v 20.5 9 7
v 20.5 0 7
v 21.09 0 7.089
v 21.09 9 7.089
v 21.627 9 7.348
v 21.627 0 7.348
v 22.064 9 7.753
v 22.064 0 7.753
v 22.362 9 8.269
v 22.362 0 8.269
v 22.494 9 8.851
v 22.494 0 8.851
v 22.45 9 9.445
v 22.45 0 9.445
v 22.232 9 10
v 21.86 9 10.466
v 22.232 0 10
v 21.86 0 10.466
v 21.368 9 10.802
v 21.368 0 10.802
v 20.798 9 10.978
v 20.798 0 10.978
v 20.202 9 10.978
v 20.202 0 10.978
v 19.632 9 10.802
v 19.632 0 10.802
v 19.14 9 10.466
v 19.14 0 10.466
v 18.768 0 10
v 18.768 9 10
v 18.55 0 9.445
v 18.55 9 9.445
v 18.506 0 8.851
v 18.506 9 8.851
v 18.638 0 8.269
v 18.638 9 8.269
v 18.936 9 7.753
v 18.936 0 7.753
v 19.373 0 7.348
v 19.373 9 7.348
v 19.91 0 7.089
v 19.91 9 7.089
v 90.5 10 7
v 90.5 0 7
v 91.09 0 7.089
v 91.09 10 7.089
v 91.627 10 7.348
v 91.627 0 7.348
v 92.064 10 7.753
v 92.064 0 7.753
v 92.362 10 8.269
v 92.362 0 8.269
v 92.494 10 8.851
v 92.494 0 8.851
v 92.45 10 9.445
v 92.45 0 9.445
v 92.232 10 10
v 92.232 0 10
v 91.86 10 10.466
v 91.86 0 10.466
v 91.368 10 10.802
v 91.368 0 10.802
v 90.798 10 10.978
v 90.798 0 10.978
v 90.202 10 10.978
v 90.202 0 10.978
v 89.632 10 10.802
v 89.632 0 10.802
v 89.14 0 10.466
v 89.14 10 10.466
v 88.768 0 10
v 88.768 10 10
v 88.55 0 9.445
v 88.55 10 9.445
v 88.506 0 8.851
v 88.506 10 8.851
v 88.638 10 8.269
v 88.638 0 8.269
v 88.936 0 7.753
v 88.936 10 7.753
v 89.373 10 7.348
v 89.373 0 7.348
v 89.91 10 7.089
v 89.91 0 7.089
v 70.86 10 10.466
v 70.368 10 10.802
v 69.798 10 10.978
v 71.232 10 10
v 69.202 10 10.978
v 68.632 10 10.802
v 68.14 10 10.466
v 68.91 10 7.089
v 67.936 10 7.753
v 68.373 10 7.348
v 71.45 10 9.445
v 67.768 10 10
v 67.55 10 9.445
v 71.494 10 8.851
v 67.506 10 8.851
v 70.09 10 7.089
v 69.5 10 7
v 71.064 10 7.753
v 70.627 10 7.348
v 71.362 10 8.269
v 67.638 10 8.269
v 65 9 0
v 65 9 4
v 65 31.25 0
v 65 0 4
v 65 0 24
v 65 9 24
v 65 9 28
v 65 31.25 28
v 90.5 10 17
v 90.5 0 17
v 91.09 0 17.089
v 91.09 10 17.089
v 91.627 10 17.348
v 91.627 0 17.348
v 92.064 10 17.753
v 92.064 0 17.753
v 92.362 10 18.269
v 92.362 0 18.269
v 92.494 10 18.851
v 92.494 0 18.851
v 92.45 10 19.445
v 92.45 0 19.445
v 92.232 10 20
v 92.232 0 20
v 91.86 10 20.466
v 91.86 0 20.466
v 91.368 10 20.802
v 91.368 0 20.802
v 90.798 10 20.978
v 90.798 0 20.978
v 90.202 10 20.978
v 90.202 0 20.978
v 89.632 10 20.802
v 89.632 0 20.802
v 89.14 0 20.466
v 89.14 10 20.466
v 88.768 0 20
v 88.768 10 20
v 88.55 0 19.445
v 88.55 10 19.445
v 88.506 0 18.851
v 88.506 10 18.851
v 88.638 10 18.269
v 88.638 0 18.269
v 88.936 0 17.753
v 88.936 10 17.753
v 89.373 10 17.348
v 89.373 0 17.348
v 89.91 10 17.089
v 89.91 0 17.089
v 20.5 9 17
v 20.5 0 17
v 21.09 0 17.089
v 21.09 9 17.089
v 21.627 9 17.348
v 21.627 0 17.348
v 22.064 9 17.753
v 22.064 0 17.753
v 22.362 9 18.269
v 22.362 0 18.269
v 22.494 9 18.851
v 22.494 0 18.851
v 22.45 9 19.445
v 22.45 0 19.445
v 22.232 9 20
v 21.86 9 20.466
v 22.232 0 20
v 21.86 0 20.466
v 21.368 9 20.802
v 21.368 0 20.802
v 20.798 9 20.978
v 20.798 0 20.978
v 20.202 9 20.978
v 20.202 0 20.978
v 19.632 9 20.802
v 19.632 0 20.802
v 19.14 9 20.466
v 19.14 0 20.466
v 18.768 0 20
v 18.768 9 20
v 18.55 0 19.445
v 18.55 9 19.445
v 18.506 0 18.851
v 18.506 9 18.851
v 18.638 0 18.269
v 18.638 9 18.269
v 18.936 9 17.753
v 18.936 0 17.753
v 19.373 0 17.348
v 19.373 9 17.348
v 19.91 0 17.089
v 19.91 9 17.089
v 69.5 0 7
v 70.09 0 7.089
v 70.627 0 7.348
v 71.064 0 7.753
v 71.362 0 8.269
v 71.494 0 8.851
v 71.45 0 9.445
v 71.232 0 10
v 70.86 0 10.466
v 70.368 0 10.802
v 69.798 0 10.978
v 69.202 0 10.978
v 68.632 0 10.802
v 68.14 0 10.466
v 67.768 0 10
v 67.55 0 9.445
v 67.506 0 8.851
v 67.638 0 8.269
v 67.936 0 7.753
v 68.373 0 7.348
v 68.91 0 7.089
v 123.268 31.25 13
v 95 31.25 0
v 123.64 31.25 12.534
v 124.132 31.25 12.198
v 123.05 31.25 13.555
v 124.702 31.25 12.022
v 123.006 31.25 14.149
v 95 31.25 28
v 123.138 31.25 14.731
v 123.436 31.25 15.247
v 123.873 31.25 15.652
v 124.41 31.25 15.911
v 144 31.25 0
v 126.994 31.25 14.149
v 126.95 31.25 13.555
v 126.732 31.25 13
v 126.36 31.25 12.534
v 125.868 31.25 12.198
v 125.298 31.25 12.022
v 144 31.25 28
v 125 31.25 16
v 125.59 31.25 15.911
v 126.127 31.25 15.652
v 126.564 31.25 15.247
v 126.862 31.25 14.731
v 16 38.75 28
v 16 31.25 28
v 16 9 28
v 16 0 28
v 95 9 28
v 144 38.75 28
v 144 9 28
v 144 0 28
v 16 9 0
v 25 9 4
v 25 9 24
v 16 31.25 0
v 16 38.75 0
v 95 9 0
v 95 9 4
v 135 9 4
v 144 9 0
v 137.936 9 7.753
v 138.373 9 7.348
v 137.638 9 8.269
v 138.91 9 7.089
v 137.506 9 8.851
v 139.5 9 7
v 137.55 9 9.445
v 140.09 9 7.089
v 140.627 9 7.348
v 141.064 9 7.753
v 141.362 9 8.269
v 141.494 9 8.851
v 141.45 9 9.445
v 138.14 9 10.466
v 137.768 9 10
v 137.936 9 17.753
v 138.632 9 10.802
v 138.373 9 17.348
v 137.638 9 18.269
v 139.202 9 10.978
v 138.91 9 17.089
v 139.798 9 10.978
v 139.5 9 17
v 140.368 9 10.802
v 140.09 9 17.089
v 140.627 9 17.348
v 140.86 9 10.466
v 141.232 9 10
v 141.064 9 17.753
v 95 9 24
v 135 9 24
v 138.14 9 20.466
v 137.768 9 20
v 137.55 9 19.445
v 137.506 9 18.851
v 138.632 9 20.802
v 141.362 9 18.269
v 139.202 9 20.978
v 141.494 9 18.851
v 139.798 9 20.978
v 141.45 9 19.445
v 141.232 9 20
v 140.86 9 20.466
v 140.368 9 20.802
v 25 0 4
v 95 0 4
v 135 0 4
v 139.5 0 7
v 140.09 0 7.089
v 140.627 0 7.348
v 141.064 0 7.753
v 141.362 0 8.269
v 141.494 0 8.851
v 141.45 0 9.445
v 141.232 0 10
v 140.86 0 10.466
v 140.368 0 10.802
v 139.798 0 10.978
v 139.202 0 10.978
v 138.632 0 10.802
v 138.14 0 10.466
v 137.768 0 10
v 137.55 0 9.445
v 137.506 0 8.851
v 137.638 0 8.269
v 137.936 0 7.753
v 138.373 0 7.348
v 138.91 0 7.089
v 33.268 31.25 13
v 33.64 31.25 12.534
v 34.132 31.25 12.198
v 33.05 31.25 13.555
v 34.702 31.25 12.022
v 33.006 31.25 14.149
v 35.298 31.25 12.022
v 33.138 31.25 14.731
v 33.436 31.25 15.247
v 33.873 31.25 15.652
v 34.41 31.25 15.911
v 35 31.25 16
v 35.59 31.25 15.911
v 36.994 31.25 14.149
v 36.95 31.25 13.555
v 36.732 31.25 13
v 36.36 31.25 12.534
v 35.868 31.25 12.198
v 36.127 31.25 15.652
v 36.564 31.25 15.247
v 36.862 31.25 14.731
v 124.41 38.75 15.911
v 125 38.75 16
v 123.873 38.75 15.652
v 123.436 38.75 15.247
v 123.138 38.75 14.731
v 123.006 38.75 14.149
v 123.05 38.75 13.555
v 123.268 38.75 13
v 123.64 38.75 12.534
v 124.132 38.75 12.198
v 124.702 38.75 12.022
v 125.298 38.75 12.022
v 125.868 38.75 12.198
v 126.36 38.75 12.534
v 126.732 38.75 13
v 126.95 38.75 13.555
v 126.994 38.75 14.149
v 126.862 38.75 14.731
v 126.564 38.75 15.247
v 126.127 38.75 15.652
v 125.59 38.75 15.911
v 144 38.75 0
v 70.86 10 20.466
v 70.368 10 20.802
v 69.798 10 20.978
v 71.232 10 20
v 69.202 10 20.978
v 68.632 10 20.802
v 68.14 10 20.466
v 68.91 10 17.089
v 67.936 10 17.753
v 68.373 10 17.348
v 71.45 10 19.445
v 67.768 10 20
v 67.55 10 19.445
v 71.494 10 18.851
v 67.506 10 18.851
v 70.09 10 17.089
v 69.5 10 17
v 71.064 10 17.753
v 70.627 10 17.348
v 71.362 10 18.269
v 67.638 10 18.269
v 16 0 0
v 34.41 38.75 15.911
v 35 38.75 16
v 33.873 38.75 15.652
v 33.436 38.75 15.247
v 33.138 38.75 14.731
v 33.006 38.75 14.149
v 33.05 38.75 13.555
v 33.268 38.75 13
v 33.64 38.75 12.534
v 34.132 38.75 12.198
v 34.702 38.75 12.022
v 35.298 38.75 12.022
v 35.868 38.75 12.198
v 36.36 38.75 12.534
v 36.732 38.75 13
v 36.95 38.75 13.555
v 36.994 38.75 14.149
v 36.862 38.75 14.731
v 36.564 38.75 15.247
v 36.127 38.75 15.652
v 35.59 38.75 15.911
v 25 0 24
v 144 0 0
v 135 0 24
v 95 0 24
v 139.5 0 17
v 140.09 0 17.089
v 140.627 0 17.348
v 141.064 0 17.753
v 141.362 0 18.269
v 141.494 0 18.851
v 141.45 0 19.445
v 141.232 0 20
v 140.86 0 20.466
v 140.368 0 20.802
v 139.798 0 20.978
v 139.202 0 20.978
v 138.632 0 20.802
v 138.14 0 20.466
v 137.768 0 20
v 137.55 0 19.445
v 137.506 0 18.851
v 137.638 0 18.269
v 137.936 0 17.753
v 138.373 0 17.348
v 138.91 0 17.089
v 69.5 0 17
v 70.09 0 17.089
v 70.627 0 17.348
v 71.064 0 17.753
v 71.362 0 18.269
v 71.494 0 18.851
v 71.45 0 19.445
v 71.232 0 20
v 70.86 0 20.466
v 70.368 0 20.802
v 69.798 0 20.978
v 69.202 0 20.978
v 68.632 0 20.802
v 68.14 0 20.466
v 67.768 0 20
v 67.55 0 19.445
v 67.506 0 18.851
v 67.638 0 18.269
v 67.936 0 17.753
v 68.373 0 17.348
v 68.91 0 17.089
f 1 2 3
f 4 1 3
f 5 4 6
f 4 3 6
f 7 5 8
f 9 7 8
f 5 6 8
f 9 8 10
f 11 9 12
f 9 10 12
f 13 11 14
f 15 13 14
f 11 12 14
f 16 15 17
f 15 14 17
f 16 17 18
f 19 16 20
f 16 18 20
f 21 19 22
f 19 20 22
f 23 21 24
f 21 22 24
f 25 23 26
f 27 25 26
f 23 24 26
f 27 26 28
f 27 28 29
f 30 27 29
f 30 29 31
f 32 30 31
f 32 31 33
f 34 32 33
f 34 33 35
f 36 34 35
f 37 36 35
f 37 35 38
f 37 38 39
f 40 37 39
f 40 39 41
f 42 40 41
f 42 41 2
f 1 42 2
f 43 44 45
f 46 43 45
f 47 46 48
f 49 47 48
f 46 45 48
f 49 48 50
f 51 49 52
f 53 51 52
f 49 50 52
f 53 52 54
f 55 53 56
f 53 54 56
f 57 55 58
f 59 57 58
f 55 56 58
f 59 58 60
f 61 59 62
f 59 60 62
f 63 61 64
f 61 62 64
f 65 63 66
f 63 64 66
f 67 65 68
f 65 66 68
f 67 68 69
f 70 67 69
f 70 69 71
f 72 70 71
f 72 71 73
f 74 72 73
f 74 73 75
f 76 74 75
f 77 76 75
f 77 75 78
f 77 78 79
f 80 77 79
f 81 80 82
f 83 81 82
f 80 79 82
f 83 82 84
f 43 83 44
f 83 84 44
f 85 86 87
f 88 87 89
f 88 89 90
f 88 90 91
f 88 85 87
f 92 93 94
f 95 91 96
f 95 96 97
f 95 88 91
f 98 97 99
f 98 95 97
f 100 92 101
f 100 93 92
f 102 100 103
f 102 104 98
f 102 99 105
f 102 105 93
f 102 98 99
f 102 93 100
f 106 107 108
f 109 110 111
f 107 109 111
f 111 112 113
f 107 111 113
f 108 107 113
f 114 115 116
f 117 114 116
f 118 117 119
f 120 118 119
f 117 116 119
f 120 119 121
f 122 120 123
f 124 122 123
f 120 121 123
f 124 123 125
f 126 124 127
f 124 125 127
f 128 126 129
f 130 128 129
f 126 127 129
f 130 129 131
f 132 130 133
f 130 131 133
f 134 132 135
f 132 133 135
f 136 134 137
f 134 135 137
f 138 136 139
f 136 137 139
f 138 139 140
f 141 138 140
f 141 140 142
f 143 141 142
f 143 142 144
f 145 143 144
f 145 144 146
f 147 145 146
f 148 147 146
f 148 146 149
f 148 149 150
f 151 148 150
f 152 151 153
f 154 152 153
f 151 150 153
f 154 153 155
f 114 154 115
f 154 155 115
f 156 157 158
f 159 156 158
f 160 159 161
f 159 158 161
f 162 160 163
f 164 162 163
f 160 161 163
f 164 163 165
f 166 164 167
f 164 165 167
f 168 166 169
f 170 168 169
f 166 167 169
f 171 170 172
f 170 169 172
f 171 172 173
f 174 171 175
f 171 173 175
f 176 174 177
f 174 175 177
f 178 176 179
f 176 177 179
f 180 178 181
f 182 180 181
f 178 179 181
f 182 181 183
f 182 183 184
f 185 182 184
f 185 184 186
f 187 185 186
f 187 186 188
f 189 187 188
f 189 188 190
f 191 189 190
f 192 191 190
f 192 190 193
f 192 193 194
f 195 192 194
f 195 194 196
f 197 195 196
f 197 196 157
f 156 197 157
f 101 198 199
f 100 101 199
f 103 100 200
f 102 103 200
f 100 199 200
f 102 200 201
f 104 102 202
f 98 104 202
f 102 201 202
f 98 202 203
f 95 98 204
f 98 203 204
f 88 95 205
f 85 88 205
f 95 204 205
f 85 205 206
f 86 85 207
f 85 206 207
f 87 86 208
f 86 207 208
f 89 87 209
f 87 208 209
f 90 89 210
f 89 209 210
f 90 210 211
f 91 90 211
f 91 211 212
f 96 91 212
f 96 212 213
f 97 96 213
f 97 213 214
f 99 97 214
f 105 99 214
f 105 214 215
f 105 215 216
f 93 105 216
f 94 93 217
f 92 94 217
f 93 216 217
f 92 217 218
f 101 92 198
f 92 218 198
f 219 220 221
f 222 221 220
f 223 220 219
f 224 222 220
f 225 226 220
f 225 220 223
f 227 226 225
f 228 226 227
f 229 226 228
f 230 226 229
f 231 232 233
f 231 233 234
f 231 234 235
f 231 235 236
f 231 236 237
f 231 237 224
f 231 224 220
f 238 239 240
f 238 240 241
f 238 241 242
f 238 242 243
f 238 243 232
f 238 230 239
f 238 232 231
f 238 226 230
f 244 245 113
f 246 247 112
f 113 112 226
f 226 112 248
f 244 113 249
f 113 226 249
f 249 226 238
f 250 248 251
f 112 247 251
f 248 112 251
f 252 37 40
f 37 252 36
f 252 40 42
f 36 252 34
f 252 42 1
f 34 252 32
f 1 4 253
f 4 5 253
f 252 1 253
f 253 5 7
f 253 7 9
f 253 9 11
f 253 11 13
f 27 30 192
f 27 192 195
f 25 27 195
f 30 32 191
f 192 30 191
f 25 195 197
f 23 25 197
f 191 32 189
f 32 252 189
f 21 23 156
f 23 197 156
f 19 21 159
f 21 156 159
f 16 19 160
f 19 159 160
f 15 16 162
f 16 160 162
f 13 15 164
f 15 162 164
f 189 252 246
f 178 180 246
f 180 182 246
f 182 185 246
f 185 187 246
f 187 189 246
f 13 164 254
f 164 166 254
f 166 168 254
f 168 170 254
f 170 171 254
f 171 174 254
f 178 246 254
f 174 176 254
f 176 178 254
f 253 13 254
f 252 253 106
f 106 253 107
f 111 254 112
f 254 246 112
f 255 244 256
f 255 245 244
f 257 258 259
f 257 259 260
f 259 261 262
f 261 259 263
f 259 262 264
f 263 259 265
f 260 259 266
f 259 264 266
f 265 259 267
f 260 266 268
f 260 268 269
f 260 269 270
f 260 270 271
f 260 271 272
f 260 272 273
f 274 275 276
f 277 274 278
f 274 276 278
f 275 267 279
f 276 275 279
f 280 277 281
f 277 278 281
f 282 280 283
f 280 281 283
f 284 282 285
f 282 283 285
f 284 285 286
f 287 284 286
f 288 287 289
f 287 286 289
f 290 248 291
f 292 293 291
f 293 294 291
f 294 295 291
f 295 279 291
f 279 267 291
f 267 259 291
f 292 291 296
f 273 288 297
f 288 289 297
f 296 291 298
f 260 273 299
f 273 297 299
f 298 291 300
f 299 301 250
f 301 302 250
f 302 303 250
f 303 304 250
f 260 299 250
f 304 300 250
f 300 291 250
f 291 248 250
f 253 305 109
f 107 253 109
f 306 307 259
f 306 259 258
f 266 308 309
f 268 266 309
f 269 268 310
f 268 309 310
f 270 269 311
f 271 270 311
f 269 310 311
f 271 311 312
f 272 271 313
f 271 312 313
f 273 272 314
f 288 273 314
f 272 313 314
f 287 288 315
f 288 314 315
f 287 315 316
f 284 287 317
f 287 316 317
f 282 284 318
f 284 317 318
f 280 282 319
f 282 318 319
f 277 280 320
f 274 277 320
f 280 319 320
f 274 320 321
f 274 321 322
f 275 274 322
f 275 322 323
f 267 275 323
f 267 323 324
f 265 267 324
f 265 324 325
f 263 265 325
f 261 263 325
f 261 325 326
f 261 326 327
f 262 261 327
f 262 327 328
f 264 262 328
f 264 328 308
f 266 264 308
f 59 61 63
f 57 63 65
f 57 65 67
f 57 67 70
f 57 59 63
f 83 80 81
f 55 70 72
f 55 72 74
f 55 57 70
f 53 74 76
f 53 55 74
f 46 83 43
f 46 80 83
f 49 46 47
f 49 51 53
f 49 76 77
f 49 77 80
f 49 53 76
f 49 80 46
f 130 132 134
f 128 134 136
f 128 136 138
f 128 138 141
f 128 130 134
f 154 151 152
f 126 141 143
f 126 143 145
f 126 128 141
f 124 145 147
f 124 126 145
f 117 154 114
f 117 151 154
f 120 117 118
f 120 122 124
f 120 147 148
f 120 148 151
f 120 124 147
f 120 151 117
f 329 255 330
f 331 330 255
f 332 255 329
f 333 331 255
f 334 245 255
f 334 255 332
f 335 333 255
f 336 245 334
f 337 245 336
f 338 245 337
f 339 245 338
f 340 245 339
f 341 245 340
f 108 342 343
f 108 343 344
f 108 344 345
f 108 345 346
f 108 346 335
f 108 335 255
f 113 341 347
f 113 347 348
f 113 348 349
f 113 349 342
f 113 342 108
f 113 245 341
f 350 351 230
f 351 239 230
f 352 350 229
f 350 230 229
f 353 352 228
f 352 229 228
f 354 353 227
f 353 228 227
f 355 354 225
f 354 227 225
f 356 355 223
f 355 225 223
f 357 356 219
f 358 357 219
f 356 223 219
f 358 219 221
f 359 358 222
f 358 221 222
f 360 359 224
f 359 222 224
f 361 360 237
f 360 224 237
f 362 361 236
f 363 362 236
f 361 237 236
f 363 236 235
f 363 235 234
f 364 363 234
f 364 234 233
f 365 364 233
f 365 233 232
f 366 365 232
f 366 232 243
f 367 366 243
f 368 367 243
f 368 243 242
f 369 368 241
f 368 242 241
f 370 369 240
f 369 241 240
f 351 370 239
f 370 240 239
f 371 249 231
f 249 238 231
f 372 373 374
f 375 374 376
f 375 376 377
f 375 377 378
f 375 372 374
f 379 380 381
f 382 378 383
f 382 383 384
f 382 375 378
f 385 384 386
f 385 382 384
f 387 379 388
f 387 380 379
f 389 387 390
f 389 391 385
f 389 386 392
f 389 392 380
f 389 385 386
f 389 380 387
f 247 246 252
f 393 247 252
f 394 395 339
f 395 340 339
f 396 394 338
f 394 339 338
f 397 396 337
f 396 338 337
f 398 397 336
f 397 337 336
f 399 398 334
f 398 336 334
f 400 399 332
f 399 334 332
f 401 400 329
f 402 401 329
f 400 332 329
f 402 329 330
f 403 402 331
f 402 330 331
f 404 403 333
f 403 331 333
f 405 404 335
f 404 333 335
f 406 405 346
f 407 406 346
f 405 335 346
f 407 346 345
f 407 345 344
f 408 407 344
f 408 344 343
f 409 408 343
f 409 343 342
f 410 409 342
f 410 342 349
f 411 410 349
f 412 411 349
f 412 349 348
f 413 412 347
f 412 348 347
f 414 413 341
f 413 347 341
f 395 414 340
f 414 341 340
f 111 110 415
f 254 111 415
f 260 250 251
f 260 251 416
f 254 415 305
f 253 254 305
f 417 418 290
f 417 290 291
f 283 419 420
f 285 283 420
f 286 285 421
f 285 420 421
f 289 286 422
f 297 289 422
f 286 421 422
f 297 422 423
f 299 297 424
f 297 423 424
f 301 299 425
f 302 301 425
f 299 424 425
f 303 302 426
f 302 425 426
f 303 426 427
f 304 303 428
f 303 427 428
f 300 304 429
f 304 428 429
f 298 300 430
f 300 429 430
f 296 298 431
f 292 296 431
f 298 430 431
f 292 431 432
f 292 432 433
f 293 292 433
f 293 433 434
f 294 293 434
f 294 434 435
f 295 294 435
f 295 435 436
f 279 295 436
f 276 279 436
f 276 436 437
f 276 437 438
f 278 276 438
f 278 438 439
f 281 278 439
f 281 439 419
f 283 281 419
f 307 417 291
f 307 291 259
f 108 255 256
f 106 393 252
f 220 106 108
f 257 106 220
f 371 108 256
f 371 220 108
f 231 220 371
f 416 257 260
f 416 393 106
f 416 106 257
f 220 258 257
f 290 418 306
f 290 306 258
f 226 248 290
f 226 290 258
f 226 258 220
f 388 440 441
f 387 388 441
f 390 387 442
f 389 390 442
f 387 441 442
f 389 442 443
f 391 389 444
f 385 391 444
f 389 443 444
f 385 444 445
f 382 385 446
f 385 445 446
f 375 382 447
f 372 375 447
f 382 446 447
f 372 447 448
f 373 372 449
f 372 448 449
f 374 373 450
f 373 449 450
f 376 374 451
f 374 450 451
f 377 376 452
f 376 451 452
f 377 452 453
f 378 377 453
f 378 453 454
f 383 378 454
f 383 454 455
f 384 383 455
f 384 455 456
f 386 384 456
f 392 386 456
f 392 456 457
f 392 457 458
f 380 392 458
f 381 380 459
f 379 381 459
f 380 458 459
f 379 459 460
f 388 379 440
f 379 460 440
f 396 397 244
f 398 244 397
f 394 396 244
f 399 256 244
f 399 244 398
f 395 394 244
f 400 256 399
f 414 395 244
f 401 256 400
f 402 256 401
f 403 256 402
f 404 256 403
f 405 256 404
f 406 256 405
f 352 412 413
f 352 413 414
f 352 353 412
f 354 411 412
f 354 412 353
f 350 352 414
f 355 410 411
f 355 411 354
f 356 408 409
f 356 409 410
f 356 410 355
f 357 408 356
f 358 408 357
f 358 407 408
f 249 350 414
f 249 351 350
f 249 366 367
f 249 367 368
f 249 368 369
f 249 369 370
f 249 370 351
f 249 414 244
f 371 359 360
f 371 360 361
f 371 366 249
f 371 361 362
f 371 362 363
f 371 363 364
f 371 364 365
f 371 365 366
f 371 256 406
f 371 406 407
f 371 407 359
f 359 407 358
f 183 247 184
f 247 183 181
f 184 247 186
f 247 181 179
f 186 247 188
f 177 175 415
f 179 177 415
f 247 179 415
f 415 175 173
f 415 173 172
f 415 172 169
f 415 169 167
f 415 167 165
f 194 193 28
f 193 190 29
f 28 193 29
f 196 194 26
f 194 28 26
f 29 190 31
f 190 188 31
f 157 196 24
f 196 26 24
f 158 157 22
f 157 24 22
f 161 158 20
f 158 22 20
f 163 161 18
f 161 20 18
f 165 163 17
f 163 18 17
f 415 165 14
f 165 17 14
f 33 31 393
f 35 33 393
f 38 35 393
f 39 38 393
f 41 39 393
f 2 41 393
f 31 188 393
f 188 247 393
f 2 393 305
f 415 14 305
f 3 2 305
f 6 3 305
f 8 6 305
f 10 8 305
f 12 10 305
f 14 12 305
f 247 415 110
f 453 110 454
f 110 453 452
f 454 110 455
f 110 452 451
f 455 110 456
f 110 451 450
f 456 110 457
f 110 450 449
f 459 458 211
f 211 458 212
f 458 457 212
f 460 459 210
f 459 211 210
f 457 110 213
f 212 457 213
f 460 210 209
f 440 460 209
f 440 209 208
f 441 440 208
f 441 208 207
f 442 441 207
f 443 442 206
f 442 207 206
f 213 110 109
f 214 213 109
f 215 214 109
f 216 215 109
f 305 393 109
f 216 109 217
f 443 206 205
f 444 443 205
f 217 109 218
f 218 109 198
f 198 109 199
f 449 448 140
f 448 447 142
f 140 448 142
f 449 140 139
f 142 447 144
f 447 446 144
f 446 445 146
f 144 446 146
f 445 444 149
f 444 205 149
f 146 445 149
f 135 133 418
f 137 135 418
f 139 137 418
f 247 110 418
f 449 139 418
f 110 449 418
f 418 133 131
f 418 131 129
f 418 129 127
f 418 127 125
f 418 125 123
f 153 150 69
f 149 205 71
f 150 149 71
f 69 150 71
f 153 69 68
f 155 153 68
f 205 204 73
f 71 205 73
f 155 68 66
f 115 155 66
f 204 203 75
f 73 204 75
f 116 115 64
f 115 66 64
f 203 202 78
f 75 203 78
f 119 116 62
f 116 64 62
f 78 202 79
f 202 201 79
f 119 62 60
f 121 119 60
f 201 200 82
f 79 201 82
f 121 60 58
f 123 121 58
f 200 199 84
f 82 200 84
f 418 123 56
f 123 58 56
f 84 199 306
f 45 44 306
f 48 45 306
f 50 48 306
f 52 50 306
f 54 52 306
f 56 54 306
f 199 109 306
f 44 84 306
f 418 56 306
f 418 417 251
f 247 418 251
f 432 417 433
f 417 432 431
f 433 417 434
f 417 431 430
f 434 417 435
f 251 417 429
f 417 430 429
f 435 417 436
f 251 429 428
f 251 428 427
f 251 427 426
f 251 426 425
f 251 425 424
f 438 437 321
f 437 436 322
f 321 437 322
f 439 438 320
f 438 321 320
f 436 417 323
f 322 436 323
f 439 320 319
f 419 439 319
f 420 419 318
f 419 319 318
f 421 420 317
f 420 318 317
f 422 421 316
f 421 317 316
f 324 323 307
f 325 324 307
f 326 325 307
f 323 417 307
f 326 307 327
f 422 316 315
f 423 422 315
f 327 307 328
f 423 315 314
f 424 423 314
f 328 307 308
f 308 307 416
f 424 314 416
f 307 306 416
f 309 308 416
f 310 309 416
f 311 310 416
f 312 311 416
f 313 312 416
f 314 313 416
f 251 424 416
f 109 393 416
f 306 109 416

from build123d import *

# Parameters (mm, degrees)
SKETCH1_W               = 160
SKETCH1_H               = 45
BOSS_EXTRUDE1_DEPTH     = 28
SKETCH3_W               = 65
SKETCH3_H               = 25
CUT_EXTRUDE2_DEPTH      = 28
CUT_EXTRUDE3_DEPTH      = 28
SKETCH8_R               = 2
CUT_EXTRUDE4_DEPTH      = 10
CUT_EXTRUDE5_DEPTH      = 169.549695936
CUT_EXTRUDE5_DEPTH_BACK = 169.549695936
SKETCH9_W               = 16
SKETCH9_H               = 28
SKETCH10_W              = 128
SKETCH10_H              = 5.5
CUT_EXTRUDE6_DEPTH      = 154.443800787
SKETCH11_W              = 128
SKETCH11_H              = 2.75
CUT_EXTRUDE7_DEPTH      = 152.921854912
SKETCH12_W              = 128
SKETCH12_H              = 2.75
BOSS_EXTRUDE3_DEPTH     = 28
SKETCH13_R              = 2
CUT_EXTRUDE8_DEPTH      = 152.230163989
SKETCH14_W              = 128
SKETCH14_H              = 28
BOSS_EXTRUDE4_DEPTH     = 2
SKETCH16_R              = 2
CUT_EXTRUDE9_DEPTH      = 152.230163989


with BuildPart() as part:
    # Sketch1 → Boss-Extrude1 (new body)
    with BuildSketch(Plane.XY):
        with Locations((80, 22.5)):
            Rectangle(SKETCH1_W, SKETCH1_H)
    extrude(amount=BOSS_EXTRUDE1_DEPTH)

    # Sketch3 → Cut-Extrude2 (cut)
    with BuildSketch(Plane.XY.offset(28)):
        with Locations((32.5, 21.5)):
            Rectangle(SKETCH3_W, SKETCH3_H)
        with Locations((127.5, 21.5)):
            Rectangle(SKETCH3_W, SKETCH3_H)
    extrude(amount=-CUT_EXTRUDE2_DEPTH, mode=Mode.SUBTRACT)

    # Sketch6 → Cut-Extrude3 (cut)
    with BuildSketch(Plane.XZ):
        Polygon((65, 14), (65, 24), (25, 24), (25, 4), (65, 4), align=None)
        Polygon((95, 4), (95, 14), (95, 24), (135, 24), (135, 4), align=None)
    extrude(amount=-CUT_EXTRUDE3_DEPTH, mode=Mode.SUBTRACT)

    # Sketch8 → Cut-Extrude4 (cut)
    with BuildSketch(Plane(origin=(0, 0, 0), x_dir=(-1, 0, 0), z_dir=(0, -1, 0))):
        with Locations(Location((-20.5, -9, 0), (0, 0, 90))):
            Circle(SKETCH8_R)
        with Locations(Location((-20.5, -19, 0), (0, 0, 90))):
            Circle(SKETCH8_R)
        with Locations(Location((-90.5, -19, 0), (0, 0, 90))):
            Circle(SKETCH8_R)
        with Locations(Location((-90.5, -9, 0), (0, 0, 90))):
            Circle(SKETCH8_R)
        with Locations(Location((-139.5, -19, 0), (0, 0, 90))):
            Circle(SKETCH8_R)
        with Locations(Location((-139.5, -9, 0), (0, 0, 90))):
            Circle(SKETCH8_R)
        with Locations(Location((-69.5, -19, 0), (0, 0, 90))):
            Circle(SKETCH8_R)
        with Locations(Location((-69.5, -9, 0), (0, 0, 90))):
            Circle(SKETCH8_R)
    extrude(amount=-CUT_EXTRUDE4_DEPTH, mode=Mode.SUBTRACT)

    # Sketch9 → Cut-Extrude5 (cut, two sides: drawn at the far end of the back side and taken through both)
    with BuildSketch(Plane(origin=(0, 0, 0), x_dir=(-1, 0, 0), z_dir=(0, -1, 0)).offset(-CUT_EXTRUDE5_DEPTH_BACK)):
        with Locations((-152, -14)):
            Rectangle(SKETCH9_W, SKETCH9_H)
        with Locations((-8, -14)):
            Rectangle(SKETCH9_W, SKETCH9_H)
    extrude(amount=CUT_EXTRUDE5_DEPTH + CUT_EXTRUDE5_DEPTH_BACK, mode=Mode.SUBTRACT)

    # Sketch10 → Cut-Extrude6 (cut, through all)
    with BuildSketch(Plane.XY.offset(28)):
        with Locations((80, 42.25)):
            Rectangle(SKETCH10_W, SKETCH10_H)
    extrude(amount=-CUT_EXTRUDE6_DEPTH, mode=Mode.SUBTRACT)

    # Sketch11 → Cut-Extrude7 (cut, through all)
    with BuildSketch(Plane.XY.offset(28)):
        with Locations((80, 38.125)):
            Rectangle(SKETCH11_W, SKETCH11_H)
    extrude(amount=-CUT_EXTRUDE7_DEPTH, mode=Mode.SUBTRACT)

    # Sketch12 → Boss-Extrude3 (add)
    with BuildSketch(Plane.XY.offset(28)):
        with Locations((80, 32.625)):
            Rectangle(SKETCH12_W, SKETCH12_H)
    extrude(amount=-BOSS_EXTRUDE3_DEPTH)

    # Sketch13 → Cut-Extrude8 (cut, through all)
    with BuildSketch(Plane(origin=(0, 36.75, 0), x_dir=(1, 0, 0), z_dir=(0, 1, 0))):
        with Locations(Location((125, -14, 0), (0, 0, 270))):
            Circle(SKETCH13_R)
        with Locations(Location((35, -14, 0), (0, 0, 270))):
            Circle(SKETCH13_R)
    extrude(amount=-CUT_EXTRUDE8_DEPTH, mode=Mode.SUBTRACT)

    # Sketch14 → Boss-Extrude4 (add)
    with BuildSketch(Plane(origin=(0, 36.75, 0), x_dir=(1, 0, 0), z_dir=(0, 1, 0))):
        with Locations((80, -14)):
            Rectangle(SKETCH14_W, SKETCH14_H)
    extrude(amount=BOSS_EXTRUDE4_DEPTH)

    # Sketch16 → Cut-Extrude9 (cut, through all)
    with BuildSketch(Plane.XZ.offset(-36.75)):
        with Locations(Location((125, 14, 0), (0, 0, 90))):
            Circle(SKETCH16_R)
        with Locations(Location((35, 14, 0), (0, 0, 90))):
            Circle(SKETCH16_R)
    extrude(amount=-CUT_EXTRUDE9_DEPTH, mode=Mode.SUBTRACT)


solid = part.part
